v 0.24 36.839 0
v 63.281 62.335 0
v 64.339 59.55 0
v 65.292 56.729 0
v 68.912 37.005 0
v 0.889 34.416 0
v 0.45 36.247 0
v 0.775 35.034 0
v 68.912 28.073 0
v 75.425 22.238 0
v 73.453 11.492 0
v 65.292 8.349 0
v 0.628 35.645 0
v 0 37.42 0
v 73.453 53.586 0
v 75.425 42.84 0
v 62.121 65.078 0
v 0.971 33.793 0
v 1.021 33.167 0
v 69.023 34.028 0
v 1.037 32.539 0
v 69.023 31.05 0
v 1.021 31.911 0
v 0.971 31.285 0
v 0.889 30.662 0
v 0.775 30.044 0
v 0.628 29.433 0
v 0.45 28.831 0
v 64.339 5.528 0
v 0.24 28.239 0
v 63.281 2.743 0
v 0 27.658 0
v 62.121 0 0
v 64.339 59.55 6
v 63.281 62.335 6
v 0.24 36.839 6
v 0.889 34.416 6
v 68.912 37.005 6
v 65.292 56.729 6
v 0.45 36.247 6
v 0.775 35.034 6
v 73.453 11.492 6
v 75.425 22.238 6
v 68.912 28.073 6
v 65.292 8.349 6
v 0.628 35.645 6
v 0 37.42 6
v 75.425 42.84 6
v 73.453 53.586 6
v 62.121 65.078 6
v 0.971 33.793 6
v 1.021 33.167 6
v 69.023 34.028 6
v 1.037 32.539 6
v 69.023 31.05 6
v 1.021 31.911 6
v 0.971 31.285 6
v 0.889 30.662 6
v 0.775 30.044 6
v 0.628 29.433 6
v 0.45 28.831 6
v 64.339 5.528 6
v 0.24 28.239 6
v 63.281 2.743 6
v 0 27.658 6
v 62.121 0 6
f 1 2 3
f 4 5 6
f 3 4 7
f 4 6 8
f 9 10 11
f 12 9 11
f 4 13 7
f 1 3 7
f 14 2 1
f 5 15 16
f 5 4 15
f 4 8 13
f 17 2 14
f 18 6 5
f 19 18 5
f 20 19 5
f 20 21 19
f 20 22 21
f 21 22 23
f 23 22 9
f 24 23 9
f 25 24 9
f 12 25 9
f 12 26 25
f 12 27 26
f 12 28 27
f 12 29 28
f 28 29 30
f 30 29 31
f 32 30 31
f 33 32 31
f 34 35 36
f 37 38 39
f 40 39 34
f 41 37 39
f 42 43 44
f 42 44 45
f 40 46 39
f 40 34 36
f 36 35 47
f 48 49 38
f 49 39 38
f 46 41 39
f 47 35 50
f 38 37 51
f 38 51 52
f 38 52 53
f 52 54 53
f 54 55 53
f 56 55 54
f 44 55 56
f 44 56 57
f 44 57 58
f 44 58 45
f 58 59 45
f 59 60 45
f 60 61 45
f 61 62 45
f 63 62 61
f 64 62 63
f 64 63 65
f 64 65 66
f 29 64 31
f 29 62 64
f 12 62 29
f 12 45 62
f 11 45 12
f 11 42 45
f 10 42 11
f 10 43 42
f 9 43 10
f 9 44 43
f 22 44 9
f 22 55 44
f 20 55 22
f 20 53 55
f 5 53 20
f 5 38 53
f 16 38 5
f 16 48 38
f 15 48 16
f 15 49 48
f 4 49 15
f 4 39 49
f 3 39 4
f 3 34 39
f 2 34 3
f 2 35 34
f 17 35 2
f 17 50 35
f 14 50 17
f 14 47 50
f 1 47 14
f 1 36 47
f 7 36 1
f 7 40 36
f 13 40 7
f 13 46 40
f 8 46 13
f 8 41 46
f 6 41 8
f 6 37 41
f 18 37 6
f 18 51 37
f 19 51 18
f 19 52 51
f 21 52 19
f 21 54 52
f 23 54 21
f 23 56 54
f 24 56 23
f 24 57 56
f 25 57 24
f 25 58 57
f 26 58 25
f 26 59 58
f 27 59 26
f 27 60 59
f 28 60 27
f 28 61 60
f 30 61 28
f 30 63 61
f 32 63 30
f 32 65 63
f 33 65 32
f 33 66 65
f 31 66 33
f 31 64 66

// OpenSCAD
$fn = 32;

// ----------------------------------------------------------------------
// Gear sector: 2 teeth on 48 degrees
// ----------------------------------------------------------------------

// --- parameters (mm) ---
sector_angle = 48;        // sector angle, degrees
root_r = 80;              // root circle radius
tooth_h = 7;              // tooth height over the root circle
teeth = 2;                // number of teeth on the sector
hub_r = 12;               // hub bore radius
plate_t = 6;              // sector thickness, Z
arc_step = 3;             // sampling step of the root/hub arcs, degrees
fit_tol = 0.02;           // declared fit tolerance (prompt contract)
free_tol = 0.2;           // declared free tolerance (prompt contract)

tip_r = root_r + tooth_h;  // tip circle radius

profile = [[62.121, 0], [63.281, 2.743], [64.339, 5.528], [65.292, 8.349], [73.453, 11.492], [75.425, 22.238], [68.912, 28.073], [69.023, 31.05], [69.023, 34.028], [68.912, 37.005], [75.425, 42.84], [73.453, 53.586], [65.292, 56.729], [64.339, 59.55], [63.281, 62.335], [62.121, 65.078], [0, 37.42], [0.24, 36.839], [0.45, 36.247], [0.628, 35.645], [0.775, 35.034], [0.889, 34.416], [0.971, 33.793], [1.021, 33.167], [1.037, 32.539], [1.021, 31.911], [0.971, 31.285], [0.889, 30.662], [0.775, 30.044], [0.628, 29.433], [0.45, 28.831], [0.24, 28.239], [0, 27.658]];  // primary outline, 33 points, counter clockwise

// --- the one profile operation ---
linear_extrude(height = plate_t) polygon(points = profile);
